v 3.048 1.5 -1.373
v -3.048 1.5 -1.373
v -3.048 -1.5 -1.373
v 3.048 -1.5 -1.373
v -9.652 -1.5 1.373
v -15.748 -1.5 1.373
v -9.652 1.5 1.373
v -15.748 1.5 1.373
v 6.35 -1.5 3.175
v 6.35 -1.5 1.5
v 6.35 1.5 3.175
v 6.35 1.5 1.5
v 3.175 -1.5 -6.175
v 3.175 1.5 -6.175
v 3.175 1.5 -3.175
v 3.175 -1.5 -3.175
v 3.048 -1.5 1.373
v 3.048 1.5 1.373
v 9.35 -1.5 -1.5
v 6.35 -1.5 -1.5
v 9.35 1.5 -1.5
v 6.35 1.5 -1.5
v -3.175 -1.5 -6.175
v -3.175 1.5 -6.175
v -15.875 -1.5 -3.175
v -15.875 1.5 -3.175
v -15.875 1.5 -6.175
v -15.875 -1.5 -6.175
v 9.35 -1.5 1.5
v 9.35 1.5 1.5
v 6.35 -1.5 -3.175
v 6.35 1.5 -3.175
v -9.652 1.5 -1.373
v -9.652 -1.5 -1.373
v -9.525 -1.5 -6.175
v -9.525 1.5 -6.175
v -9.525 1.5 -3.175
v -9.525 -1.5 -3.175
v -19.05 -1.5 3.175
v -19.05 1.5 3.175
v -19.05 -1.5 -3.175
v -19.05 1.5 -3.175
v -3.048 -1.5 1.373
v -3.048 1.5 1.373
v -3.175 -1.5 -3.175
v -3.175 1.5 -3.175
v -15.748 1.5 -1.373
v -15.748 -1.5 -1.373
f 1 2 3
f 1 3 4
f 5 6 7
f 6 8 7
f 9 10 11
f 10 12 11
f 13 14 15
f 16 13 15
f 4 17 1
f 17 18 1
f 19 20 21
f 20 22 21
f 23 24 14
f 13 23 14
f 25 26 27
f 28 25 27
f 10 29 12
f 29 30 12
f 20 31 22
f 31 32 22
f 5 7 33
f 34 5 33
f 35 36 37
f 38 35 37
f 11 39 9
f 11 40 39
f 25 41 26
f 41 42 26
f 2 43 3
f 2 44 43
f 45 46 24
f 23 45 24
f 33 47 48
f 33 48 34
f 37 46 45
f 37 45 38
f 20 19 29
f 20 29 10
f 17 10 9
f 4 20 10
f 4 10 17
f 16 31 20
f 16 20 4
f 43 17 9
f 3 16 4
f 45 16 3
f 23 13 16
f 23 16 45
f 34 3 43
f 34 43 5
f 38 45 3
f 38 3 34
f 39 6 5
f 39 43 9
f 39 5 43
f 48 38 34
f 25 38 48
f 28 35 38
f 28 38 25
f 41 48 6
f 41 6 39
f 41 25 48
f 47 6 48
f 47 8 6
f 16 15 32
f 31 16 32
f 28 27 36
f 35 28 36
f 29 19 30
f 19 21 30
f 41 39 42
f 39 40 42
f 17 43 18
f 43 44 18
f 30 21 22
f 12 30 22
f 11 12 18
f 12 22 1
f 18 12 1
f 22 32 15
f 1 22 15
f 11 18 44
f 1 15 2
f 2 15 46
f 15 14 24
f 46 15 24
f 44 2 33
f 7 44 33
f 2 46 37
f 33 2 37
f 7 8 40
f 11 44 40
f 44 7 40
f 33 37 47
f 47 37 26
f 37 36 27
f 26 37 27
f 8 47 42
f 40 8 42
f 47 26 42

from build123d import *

# Parameters (mm, degrees)
SKETCH1_W           = 6.096
SKETCH1_H           = 2.745994
BOSS_EXTRUDE1_DEPTH = 1.5


with BuildPart() as part:
    # Sketch1 → Boss-Extrude1 (new, symmetric)
    with BuildSketch(Plane(origin=(0, 0, 0), x_dir=(1, 0, 0), z_dir=(0, 1, 0))):
        Polygon((3.175, 3.175), (6.35, 3.175), (6.35, 1.5), (9.35, 1.5), (9.35, -1.5), (6.35, -1.5), (6.35, -3.175), (-6.35, -3.175), (-19.05, -3.175), (-19.05, 3.175), (-15.875, 3.175), (-15.875, 6.175), (-9.525, 6.175), (-9.525, 3.175), (-6.35, 3.175), (-3.175, 3.175), (-3.175, 6.175), (3.175, 6.175), align=None)
        Rectangle(SKETCH1_W, SKETCH1_H, mode=Mode.SUBTRACT)
        with Locations((-12.7, 0)):
            Rectangle(SKETCH1_W, SKETCH1_H, mode=Mode.SUBTRACT)
    extrude(amount=BOSS_EXTRUDE1_DEPTH, both=True)


solid = part.part
